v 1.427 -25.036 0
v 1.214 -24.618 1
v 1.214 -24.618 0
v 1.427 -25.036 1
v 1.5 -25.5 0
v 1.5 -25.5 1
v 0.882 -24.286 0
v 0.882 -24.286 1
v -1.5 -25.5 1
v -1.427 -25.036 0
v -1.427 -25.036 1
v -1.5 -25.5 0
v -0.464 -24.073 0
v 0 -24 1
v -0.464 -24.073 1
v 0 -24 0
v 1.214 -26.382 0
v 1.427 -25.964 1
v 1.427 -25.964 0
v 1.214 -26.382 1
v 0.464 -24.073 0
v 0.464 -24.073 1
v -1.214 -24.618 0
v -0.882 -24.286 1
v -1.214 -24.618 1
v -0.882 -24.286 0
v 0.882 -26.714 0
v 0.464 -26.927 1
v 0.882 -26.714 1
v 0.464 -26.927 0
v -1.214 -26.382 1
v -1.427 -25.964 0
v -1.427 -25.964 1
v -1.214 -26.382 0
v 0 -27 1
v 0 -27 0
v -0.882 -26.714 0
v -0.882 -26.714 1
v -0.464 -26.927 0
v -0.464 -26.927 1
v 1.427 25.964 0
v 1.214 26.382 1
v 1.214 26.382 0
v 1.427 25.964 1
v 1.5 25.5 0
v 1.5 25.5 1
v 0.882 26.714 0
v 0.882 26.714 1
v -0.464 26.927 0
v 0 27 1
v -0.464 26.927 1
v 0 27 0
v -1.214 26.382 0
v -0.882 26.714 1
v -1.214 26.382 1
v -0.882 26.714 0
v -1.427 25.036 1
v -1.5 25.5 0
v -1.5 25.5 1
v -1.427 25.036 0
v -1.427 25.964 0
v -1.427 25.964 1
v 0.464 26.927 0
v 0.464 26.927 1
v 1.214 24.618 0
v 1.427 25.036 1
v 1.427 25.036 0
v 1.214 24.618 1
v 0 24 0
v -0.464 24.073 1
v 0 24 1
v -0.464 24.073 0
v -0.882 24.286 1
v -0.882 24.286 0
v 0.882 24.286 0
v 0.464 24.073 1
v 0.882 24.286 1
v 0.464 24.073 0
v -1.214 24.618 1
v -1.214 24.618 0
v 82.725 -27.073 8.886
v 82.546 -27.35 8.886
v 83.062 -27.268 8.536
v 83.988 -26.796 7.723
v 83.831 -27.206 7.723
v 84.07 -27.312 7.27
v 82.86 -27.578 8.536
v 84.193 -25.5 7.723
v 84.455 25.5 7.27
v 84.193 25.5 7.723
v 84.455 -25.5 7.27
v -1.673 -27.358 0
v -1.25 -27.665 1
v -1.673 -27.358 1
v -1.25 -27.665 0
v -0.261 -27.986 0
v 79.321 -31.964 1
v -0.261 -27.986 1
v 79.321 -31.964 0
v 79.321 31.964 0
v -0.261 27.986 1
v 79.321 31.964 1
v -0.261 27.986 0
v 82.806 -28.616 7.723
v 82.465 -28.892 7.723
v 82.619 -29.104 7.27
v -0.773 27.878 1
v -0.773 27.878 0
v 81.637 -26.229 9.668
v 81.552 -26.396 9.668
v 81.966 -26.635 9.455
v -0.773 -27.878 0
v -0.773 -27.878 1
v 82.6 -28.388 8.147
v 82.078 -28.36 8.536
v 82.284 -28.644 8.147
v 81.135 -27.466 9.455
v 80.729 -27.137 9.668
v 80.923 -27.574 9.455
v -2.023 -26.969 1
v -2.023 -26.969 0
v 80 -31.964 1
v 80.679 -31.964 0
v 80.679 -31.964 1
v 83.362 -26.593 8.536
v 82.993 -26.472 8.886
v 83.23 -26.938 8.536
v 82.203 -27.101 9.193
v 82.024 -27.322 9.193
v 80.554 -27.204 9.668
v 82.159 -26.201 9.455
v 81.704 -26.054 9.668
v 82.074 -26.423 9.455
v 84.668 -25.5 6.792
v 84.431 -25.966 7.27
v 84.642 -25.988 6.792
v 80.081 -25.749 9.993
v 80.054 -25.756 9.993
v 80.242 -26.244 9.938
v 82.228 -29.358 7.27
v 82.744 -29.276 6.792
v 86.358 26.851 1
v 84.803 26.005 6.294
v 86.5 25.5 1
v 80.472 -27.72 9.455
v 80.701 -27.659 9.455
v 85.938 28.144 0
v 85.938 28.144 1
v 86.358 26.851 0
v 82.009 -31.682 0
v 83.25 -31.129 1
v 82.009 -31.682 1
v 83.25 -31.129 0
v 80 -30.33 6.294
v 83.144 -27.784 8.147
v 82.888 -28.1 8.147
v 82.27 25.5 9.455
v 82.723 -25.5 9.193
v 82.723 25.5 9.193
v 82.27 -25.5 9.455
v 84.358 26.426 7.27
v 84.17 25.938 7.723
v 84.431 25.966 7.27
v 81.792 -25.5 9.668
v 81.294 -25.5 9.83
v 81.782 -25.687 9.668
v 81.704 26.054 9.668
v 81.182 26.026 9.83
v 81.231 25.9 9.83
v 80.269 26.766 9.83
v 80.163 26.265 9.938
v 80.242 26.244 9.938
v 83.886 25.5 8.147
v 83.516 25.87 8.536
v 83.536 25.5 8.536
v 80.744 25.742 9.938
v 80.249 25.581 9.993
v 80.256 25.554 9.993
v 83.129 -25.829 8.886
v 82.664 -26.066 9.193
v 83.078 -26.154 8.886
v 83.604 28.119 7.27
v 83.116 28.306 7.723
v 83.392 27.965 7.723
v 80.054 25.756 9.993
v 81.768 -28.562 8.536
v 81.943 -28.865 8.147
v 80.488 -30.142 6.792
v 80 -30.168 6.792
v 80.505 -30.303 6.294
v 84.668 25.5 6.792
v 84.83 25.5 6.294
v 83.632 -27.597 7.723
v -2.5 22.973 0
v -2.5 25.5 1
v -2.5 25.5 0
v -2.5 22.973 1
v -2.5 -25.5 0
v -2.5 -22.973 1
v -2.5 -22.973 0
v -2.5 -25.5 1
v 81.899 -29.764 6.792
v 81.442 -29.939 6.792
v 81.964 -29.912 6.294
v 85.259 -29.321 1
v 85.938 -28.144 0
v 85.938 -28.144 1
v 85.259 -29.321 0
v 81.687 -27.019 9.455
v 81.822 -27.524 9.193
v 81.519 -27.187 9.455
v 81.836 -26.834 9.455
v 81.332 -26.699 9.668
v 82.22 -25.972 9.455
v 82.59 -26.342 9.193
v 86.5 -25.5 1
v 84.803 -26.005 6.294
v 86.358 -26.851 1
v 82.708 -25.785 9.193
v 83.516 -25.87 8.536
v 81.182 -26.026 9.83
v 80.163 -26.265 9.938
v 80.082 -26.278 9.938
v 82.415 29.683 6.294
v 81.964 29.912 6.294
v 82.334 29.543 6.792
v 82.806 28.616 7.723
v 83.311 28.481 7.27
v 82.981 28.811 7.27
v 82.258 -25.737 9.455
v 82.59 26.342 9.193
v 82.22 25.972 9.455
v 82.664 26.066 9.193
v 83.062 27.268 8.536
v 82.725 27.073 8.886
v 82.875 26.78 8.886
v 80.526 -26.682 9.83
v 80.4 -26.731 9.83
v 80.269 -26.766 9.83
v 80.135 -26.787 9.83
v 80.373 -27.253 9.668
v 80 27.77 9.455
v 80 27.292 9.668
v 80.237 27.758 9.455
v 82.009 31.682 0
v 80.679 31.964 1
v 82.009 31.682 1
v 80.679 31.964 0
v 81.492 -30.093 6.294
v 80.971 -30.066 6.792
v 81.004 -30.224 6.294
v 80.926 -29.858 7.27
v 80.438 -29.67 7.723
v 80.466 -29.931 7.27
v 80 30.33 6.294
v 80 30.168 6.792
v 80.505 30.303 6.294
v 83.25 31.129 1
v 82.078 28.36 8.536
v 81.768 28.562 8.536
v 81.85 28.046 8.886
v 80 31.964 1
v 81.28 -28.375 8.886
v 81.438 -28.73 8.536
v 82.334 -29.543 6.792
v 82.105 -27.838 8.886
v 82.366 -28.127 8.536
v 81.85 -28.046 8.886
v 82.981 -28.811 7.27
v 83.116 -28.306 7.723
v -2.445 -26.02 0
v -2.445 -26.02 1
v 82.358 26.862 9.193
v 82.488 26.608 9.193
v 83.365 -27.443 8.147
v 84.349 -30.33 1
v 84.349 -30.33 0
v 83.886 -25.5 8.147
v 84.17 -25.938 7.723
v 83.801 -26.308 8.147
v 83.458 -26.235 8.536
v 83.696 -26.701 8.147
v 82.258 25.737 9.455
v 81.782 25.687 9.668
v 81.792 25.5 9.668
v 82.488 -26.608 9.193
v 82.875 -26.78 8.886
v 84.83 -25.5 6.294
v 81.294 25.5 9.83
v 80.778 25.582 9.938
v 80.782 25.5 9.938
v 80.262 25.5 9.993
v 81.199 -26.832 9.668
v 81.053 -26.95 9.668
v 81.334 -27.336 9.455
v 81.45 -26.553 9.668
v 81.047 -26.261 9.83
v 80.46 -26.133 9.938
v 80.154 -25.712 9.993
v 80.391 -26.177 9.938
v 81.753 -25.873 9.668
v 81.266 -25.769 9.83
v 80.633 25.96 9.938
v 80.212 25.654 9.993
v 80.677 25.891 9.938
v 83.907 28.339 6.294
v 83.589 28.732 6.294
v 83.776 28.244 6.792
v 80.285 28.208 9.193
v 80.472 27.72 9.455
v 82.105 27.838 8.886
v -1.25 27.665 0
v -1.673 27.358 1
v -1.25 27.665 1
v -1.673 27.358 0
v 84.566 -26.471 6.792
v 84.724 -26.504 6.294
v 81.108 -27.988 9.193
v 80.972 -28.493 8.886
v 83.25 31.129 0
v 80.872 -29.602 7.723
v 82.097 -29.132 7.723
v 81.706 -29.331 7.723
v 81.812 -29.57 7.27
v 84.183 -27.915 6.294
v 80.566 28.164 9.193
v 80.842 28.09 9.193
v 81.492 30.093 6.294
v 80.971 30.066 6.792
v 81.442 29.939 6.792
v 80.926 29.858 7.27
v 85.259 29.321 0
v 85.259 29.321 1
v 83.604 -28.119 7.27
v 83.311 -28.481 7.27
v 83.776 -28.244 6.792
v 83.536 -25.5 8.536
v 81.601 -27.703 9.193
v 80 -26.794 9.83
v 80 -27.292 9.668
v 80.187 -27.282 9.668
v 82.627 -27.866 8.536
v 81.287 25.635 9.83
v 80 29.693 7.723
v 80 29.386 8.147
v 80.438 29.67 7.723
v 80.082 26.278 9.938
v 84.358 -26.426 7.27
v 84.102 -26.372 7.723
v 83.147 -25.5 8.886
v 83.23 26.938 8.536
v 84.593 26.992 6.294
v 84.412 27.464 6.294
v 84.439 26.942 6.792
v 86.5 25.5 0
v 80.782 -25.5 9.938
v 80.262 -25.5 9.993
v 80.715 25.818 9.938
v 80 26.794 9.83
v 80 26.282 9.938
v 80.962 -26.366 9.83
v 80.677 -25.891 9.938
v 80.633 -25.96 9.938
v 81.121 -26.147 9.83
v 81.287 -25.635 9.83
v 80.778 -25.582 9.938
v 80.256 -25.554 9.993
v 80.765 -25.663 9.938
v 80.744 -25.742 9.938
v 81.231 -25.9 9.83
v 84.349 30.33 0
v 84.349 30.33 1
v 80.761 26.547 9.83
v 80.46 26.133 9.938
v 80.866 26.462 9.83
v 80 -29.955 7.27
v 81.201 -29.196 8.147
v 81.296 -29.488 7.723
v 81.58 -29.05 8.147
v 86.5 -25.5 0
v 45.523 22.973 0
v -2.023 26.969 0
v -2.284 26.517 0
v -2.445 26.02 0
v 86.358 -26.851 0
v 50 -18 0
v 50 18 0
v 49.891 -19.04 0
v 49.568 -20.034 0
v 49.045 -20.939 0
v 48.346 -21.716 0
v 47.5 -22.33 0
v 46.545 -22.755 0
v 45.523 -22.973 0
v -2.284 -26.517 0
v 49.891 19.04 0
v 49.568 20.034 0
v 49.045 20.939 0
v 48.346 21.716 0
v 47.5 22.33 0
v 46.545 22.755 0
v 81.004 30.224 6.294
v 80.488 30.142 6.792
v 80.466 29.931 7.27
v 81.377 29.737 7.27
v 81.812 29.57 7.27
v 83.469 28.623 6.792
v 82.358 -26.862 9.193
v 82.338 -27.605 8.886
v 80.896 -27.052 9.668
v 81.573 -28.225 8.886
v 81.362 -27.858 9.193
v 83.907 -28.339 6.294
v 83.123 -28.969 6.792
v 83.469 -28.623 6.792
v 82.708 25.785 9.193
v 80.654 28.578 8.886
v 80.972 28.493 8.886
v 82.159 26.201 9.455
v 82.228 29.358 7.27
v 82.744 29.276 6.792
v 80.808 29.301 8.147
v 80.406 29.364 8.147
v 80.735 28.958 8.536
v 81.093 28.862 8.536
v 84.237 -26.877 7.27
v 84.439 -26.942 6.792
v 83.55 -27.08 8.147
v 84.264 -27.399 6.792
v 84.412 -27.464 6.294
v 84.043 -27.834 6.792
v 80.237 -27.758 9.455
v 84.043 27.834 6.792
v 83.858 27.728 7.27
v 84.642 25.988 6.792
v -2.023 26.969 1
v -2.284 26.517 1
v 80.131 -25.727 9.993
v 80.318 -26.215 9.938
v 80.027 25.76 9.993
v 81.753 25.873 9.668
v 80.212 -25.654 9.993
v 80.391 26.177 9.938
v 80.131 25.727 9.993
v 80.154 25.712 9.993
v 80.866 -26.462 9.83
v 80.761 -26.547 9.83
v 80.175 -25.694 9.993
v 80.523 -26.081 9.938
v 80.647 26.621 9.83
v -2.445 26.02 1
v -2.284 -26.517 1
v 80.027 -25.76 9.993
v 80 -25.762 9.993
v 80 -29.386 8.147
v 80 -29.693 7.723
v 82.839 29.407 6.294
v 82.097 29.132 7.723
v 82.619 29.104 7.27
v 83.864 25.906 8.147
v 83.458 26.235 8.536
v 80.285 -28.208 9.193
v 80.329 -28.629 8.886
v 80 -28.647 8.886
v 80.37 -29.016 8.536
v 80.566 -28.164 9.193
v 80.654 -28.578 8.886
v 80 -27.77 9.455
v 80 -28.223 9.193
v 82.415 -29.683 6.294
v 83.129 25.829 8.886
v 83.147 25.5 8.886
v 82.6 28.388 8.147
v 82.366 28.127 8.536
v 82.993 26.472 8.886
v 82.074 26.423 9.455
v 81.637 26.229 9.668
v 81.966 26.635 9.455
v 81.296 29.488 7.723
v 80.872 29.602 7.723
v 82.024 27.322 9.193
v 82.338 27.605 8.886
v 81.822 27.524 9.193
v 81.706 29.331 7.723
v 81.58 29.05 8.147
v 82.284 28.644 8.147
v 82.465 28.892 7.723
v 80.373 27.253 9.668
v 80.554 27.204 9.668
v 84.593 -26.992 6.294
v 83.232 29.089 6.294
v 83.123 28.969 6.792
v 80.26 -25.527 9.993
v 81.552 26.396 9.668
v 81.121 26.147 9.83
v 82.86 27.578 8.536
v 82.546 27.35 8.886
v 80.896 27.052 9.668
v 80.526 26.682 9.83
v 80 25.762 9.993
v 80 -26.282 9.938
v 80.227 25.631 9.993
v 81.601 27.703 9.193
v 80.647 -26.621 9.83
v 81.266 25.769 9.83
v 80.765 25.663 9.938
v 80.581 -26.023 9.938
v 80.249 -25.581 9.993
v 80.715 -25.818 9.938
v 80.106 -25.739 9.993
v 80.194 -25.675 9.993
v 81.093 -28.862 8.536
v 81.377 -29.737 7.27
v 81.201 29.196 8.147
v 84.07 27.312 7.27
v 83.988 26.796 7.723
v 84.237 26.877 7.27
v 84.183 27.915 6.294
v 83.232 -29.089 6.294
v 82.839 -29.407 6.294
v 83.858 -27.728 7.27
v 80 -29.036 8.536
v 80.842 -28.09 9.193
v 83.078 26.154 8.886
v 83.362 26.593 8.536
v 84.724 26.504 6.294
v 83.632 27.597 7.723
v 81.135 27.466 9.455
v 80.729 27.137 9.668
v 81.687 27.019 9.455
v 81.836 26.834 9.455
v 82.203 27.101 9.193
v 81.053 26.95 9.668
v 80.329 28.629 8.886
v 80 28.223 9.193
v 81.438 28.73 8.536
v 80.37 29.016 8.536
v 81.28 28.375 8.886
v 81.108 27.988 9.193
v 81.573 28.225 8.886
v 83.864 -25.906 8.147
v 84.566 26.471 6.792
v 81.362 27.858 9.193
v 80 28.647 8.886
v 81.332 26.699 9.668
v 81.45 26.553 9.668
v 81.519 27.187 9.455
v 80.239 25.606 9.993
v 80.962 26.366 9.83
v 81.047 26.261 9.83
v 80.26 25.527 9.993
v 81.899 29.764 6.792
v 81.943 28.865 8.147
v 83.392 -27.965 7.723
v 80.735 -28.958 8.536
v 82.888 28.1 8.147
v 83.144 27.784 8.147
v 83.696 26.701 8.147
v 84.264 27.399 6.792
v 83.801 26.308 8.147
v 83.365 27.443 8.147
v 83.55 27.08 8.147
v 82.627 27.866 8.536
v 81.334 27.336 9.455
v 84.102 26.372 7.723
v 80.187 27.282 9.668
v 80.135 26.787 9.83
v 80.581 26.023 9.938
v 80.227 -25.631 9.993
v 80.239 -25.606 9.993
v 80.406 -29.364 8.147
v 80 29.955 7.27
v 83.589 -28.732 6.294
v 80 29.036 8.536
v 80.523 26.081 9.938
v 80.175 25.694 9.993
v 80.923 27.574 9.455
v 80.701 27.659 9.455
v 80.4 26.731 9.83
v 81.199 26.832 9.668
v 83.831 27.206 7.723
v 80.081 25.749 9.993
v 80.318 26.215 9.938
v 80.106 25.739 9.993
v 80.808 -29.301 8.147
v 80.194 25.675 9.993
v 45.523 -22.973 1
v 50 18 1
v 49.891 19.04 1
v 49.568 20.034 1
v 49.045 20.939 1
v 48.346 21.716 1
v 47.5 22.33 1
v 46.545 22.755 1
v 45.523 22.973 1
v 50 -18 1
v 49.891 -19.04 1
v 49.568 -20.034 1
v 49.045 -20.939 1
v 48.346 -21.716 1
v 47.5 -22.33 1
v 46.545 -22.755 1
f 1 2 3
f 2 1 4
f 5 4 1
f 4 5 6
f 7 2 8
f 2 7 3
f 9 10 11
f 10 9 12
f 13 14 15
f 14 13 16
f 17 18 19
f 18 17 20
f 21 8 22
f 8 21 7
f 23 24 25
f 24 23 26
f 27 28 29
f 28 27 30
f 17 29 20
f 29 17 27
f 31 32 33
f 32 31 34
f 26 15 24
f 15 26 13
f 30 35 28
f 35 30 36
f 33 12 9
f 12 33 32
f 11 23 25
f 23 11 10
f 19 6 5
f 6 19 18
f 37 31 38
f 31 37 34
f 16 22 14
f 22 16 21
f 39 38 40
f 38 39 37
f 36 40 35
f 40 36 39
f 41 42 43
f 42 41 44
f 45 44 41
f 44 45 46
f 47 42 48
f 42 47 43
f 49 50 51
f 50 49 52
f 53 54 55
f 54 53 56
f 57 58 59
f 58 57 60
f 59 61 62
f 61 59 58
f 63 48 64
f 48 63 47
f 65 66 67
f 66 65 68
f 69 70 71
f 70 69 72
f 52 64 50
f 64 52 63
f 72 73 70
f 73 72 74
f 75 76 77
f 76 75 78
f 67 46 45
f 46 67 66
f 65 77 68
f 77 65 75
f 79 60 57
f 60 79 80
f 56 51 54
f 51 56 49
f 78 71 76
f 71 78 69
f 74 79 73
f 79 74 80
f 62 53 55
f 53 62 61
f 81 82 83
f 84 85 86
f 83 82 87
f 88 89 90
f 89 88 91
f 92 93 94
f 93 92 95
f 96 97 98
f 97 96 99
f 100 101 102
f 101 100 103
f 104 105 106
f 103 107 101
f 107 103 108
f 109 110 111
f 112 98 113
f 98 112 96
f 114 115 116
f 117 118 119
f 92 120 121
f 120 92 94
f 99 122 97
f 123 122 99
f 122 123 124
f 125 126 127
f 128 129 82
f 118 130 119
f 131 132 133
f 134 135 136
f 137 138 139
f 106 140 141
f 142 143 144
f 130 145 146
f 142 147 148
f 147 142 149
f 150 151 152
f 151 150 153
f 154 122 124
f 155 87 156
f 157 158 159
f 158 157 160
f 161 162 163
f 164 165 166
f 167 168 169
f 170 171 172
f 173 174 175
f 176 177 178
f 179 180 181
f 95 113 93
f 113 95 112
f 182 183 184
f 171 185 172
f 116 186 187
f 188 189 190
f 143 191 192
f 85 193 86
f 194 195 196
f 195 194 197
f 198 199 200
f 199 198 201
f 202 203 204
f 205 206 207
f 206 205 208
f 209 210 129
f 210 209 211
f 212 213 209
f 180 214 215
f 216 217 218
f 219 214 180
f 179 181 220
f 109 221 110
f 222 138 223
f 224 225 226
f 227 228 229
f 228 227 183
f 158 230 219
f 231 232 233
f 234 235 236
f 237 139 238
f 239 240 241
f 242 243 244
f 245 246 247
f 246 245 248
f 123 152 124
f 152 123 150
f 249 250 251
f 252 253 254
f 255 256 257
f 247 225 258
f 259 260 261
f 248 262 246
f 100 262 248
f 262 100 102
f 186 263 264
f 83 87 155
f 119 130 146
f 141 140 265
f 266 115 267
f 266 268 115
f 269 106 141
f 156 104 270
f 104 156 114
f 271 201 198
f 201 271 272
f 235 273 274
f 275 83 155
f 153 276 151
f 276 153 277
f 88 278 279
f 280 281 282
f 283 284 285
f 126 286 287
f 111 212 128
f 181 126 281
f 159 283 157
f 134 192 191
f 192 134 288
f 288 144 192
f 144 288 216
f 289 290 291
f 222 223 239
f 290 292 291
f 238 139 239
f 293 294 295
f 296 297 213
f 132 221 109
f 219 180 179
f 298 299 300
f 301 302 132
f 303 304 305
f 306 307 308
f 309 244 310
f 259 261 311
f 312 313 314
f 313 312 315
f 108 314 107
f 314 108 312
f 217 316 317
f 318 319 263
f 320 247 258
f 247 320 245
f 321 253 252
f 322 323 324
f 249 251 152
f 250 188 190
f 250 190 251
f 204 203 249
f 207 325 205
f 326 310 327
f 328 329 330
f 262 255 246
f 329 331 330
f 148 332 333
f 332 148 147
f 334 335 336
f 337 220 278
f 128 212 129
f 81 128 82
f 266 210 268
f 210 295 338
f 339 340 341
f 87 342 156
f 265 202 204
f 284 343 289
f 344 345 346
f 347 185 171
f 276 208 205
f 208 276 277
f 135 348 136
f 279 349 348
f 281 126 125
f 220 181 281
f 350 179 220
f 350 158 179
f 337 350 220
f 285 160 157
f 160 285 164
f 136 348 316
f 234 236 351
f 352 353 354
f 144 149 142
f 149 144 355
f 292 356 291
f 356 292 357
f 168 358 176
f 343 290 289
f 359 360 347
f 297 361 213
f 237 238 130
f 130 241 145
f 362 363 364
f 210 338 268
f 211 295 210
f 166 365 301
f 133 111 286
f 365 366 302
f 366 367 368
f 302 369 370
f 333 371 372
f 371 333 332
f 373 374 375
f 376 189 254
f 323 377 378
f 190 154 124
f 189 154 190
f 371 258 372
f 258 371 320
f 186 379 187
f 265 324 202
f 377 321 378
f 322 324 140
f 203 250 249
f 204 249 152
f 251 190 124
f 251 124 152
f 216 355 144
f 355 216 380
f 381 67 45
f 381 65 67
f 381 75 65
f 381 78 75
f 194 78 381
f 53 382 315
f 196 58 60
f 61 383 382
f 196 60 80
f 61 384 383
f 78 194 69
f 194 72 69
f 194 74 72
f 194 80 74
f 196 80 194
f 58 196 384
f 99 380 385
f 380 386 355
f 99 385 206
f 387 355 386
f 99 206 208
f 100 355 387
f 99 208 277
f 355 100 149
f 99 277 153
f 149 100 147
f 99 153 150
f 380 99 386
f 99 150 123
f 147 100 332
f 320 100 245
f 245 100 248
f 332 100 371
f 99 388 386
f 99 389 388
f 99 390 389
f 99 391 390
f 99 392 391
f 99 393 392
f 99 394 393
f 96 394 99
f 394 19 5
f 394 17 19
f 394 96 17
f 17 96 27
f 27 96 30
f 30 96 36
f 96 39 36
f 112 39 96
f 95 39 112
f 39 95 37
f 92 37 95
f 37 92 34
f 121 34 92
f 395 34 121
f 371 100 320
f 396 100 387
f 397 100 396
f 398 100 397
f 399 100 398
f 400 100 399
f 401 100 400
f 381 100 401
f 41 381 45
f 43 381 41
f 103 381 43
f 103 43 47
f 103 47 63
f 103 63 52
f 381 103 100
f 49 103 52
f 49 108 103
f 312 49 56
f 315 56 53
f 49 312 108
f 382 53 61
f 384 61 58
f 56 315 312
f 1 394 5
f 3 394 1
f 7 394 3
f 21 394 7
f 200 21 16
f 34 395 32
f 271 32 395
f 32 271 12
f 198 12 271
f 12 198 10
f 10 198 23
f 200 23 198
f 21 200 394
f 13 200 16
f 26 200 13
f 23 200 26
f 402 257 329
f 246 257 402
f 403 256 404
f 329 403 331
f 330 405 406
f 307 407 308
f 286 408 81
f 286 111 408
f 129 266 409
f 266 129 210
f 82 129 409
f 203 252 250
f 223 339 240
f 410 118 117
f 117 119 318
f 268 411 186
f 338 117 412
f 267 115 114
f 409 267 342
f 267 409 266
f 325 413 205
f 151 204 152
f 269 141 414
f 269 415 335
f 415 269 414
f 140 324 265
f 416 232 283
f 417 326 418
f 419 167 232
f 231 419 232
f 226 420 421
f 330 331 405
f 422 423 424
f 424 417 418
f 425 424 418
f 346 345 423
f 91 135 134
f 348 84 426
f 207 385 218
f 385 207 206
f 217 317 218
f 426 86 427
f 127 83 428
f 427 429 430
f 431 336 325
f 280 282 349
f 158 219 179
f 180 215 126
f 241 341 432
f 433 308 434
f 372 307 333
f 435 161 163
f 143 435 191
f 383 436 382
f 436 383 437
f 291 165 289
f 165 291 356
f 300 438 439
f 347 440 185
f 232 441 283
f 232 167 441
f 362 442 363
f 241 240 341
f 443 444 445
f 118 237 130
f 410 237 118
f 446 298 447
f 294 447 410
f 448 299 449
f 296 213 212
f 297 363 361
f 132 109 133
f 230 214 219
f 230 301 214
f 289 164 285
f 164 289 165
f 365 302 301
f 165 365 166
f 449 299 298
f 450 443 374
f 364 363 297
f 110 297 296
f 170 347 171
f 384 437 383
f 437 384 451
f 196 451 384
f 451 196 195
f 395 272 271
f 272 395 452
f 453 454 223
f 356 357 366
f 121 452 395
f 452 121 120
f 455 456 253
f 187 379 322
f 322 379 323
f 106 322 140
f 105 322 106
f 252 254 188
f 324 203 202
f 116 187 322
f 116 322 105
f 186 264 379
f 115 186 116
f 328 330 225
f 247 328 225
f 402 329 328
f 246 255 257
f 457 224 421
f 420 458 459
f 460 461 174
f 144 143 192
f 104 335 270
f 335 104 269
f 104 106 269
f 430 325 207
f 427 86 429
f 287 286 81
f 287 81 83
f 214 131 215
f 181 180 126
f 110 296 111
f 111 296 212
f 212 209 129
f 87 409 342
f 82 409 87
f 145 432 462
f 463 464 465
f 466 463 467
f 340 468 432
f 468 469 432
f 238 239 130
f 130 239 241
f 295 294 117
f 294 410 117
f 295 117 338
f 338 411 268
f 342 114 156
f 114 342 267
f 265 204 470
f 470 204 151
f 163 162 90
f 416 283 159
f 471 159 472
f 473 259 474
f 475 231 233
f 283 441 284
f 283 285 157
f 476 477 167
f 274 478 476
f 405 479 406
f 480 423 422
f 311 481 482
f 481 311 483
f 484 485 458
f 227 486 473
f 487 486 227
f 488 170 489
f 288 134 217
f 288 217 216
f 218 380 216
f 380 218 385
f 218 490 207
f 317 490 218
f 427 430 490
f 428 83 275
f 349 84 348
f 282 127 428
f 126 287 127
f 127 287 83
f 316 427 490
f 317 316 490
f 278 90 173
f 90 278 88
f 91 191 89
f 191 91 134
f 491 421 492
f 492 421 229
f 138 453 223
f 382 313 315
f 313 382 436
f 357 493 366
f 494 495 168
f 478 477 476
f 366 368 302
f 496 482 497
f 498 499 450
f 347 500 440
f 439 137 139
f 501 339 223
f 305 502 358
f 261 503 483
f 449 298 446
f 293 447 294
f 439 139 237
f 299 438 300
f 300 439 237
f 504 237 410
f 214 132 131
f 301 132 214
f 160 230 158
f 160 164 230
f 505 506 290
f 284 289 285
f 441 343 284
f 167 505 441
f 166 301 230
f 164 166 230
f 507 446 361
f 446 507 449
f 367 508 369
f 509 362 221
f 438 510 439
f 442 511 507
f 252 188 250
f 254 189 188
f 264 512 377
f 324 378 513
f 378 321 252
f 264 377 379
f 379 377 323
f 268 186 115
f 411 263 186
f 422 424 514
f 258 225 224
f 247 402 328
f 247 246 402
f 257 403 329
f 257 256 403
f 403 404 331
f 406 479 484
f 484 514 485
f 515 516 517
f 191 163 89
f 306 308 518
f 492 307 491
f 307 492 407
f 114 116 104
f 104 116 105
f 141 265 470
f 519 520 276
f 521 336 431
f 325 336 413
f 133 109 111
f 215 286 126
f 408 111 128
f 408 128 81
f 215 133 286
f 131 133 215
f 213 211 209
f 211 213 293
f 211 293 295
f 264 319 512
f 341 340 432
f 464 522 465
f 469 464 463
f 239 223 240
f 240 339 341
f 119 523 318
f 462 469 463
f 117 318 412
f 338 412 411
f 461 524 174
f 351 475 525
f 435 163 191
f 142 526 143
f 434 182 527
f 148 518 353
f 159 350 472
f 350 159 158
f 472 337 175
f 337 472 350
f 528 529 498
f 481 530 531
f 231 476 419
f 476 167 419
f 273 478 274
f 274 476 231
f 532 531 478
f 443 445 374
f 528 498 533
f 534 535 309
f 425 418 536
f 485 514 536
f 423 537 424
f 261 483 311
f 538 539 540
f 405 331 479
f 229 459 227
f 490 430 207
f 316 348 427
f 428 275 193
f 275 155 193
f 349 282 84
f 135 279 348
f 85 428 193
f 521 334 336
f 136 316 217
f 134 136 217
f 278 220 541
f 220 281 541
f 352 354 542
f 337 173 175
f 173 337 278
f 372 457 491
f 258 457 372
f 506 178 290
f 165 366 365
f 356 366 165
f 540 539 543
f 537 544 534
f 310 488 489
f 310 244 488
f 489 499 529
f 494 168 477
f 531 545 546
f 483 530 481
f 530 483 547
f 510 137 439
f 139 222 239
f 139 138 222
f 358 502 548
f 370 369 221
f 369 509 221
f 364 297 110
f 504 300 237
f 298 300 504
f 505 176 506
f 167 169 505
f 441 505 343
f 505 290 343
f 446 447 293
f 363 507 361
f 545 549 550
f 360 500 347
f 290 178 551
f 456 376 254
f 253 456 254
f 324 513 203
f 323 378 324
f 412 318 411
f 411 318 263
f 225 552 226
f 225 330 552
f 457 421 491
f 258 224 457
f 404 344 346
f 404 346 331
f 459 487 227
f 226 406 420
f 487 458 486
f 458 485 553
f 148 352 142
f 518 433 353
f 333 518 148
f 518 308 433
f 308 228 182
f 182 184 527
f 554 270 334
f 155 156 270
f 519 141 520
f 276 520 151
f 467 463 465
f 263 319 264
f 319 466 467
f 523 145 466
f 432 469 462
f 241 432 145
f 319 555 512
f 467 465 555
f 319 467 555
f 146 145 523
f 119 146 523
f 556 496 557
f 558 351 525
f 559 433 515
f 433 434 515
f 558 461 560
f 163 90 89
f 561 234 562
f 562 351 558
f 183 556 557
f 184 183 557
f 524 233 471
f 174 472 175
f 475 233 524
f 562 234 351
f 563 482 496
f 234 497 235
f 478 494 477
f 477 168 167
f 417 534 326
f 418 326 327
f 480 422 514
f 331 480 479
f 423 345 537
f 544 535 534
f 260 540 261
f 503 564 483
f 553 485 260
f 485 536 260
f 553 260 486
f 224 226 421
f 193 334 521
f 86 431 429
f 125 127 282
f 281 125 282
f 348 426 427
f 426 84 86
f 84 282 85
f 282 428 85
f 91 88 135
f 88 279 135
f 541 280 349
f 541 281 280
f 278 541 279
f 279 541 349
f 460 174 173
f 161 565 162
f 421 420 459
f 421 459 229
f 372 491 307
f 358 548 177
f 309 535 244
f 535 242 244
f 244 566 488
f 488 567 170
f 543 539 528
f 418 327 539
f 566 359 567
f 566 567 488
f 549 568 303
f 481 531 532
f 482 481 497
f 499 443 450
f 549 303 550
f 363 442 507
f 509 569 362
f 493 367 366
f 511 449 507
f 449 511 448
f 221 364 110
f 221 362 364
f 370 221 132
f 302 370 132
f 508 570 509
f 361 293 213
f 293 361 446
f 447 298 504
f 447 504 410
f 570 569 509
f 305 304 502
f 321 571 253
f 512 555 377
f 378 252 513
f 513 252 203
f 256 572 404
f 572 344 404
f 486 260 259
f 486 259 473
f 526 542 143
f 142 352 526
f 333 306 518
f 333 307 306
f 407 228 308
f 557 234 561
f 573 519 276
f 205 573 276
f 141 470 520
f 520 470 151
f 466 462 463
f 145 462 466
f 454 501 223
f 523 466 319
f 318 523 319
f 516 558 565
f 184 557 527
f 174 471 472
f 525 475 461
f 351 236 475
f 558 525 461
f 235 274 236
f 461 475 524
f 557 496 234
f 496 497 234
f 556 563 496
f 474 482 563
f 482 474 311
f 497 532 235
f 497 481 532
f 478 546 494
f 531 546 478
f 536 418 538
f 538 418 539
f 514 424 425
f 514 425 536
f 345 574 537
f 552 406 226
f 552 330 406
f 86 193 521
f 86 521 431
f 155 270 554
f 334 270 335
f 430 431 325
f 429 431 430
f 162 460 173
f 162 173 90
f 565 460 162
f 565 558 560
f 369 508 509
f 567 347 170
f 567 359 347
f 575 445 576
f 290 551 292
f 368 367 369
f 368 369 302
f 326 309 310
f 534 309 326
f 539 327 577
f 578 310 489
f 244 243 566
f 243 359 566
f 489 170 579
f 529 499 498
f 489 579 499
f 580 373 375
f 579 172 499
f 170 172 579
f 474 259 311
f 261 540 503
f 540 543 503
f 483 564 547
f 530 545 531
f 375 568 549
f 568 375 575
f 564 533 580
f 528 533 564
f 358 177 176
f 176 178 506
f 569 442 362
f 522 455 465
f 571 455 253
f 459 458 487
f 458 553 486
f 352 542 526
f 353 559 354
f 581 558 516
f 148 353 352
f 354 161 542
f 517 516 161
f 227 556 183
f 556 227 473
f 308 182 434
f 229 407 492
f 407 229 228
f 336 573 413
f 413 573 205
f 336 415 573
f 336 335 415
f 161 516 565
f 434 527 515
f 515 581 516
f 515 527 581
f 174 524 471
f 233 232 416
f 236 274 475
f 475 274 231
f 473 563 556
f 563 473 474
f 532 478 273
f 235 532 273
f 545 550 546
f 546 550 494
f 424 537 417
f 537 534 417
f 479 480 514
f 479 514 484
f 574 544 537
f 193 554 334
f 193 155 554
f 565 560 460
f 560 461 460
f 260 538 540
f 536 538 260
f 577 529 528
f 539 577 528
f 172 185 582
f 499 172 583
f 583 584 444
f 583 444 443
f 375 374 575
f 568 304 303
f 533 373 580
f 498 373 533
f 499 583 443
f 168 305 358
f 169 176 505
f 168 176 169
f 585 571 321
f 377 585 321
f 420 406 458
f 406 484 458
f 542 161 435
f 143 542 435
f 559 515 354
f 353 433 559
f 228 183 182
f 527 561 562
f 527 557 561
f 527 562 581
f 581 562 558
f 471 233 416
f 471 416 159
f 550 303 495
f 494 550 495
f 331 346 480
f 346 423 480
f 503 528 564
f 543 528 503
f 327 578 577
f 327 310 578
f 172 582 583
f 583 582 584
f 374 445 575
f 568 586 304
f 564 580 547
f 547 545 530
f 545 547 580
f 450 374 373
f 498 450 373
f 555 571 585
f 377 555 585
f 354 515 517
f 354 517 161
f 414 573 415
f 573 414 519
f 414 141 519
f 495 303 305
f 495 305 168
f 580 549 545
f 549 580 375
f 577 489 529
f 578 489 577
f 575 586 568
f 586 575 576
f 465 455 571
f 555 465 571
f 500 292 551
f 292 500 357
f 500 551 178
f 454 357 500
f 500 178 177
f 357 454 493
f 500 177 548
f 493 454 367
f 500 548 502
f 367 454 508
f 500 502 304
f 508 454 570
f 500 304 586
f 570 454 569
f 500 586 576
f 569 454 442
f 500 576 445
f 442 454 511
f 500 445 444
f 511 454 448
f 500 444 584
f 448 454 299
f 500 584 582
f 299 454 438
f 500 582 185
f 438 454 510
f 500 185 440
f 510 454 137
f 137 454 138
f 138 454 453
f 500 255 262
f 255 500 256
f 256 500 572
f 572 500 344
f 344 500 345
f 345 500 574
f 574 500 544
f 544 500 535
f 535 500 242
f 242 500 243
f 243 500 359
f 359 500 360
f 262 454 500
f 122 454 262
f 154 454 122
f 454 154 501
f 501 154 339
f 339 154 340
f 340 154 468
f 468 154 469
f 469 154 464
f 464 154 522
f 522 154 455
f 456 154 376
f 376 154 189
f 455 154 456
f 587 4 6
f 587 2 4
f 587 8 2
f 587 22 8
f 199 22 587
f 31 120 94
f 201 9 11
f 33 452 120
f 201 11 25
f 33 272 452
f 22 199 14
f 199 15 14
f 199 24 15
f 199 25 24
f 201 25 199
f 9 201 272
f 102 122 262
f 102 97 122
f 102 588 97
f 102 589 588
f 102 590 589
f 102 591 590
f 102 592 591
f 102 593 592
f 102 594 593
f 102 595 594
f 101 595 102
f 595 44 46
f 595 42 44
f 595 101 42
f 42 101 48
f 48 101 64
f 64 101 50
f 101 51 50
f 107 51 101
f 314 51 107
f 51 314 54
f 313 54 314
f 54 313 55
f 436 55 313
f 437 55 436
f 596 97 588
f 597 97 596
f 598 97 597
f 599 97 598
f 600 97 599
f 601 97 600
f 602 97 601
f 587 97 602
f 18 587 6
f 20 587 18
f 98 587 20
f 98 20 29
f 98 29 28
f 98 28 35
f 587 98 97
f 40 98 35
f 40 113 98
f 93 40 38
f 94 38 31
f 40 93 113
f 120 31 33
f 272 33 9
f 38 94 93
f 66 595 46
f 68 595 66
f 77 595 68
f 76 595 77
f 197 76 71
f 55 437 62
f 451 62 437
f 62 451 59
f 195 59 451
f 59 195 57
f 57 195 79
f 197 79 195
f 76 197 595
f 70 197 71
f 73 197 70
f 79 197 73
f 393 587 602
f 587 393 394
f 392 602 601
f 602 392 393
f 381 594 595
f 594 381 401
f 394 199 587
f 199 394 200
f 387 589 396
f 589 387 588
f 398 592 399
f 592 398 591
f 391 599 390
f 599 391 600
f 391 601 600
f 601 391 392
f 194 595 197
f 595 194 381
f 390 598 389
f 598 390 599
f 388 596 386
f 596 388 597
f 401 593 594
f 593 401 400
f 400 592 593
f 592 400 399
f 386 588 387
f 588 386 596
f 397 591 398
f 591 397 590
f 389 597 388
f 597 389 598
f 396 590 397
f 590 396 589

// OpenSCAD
HANDLE_HEIGHT = 80;
MCU_HOLE_W = 51;

module box (sizes, centering=[1, 1, 1], extra_negative=[0, 0, 0]) {
    translate ([
        -sizes[0]*centering[0]/2-extra_negative[0],
        -sizes[1]*centering[1]/2-extra_negative[1],
        -sizes[2]*centering[2]/2-extra_negative[2],
    ]) {
        cube ([
            sizes[0]+extra_negative[0],
            sizes[1]+extra_negative[1],
            sizes[2]+extra_negative[2],
        ]);
    }
}

$fn=30;

module hook () {
    difference () {
        hull () {
            for (y=[-1, 1]) translate ([0, y*MCU_HOLE_W/2, 0]) {
                for (x=[0, 1]) translate ([x*HANDLE_HEIGHT, 0, 0]) {
                    cylinder (1, r=2.5+x*4);
                }
                translate ([HANDLE_HEIGHT, 0, 5]) {
                    sphere (r=5, $fn=60);
                }
            }
        }
        translate ([0, 0, 1]) box ([HANDLE_HEIGHT*2, 200, 100], [1, 1, 0]);
        for (y=[-1, 1]) translate ([0, y*MCU_HOLE_W/2, -1]) {
            cylinder (10, r=3/2, $fn=20);
        }
        hull () {
            for (y=[-1, 1]) for (x=[-1, 1]) translate ([x*45, y*18, -1]) {
                cylinder (10, r=5);
            }
        }
    }
}

hook();
